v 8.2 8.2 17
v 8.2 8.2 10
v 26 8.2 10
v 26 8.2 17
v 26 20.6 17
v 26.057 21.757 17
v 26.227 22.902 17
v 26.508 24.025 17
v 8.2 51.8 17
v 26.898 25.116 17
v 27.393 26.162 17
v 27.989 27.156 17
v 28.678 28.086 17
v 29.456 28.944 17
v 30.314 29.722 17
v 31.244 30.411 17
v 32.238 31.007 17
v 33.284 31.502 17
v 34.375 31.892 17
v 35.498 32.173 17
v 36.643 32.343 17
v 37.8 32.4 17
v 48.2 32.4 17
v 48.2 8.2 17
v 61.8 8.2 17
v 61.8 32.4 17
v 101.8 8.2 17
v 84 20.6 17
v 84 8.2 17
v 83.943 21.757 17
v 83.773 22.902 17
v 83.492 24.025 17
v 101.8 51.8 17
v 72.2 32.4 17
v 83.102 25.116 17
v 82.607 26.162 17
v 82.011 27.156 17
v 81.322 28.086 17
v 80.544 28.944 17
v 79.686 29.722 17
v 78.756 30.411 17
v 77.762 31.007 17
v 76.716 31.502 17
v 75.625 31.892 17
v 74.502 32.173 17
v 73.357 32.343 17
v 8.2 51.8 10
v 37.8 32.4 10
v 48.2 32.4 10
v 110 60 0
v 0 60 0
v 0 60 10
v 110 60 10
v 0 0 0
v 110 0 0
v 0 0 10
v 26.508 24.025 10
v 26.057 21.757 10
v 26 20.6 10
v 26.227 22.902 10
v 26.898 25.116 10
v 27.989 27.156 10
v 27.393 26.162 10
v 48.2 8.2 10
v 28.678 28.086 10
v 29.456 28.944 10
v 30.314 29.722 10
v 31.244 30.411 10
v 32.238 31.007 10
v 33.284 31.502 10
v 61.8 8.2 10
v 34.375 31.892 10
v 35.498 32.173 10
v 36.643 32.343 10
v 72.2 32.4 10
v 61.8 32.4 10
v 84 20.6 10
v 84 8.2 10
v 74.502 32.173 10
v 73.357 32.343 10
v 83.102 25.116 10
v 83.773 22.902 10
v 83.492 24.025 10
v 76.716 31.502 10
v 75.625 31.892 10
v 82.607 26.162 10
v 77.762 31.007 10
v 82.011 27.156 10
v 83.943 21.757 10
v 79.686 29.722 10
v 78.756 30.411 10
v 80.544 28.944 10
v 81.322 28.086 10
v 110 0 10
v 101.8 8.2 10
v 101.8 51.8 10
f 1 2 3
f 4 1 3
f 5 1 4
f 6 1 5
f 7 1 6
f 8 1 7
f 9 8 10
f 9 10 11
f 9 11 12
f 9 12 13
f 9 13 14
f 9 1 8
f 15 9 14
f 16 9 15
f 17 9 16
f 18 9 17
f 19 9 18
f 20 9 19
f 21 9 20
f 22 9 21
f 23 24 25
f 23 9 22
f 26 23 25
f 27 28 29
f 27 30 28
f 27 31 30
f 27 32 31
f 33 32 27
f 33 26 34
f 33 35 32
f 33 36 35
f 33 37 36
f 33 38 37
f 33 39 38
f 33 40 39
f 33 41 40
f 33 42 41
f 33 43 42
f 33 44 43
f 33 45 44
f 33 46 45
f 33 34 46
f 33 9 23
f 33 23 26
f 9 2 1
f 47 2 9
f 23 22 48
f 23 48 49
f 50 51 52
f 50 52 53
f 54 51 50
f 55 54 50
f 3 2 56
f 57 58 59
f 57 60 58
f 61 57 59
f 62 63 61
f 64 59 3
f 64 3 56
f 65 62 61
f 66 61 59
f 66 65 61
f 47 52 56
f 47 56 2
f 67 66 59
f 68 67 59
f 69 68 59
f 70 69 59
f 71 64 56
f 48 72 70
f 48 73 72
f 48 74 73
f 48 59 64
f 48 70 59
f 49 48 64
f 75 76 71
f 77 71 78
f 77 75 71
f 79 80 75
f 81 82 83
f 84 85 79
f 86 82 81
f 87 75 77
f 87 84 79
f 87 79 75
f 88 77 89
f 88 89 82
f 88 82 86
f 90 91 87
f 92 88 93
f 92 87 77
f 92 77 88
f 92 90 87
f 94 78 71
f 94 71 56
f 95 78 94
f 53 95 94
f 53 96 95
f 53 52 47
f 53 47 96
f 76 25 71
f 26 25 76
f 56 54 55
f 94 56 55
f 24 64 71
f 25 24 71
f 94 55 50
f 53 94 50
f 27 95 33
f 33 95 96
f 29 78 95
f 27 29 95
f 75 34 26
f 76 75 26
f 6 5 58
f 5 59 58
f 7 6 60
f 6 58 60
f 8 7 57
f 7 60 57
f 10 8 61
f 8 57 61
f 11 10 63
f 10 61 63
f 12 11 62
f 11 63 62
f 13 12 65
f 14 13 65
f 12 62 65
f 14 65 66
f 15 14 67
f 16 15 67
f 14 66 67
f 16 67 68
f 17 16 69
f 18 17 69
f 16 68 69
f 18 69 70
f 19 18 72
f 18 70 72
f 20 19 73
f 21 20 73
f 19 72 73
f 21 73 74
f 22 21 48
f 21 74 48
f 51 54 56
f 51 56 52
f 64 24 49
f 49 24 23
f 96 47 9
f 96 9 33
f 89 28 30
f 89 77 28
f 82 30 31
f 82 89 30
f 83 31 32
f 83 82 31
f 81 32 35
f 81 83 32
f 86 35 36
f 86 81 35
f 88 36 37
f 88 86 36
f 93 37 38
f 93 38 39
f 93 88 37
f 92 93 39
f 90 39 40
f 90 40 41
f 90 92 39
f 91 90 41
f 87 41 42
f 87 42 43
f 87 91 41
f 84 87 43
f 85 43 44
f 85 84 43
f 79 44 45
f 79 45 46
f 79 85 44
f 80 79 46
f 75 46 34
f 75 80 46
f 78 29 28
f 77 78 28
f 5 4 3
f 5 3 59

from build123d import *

# Parameters (mm, degrees)
SKETCH1_W            = 110
SKETCH1_H            = 60
BOSS_EXTRUDE1_DEPTH  = 10
SKETCH3_W            = 93.6
SKETCH3_H            = 43.6
BOSS_EXTRUDE2_DEPTH  = 7
SKETCH4_W            = 22.2
SKETCH4_H            = 24.2
CUT_EXTRUDE1_DEPTH   = 7
FILLET1_R            = 11.8
FILLET1_OF_MIRROR1_R = 11.8


with BuildPart() as part:
    # Sketch1 → Boss-Extrude1 (new body)
    with BuildSketch(Plane.XY):
        with Locations((55, 30)):
            Rectangle(SKETCH1_W, SKETCH1_H)
    extrude(amount=BOSS_EXTRUDE1_DEPTH)

    # Sketch3 → Boss-Extrude2 (add)
    with BuildSketch(Plane.XY.offset(10)):
        with Locations((55, 30)):
            Rectangle(SKETCH3_W, SKETCH3_H)
    extrude(amount=BOSS_EXTRUDE2_DEPTH)

    # Sketch4 → Cut-Extrude1 (cut)
    with BuildSketch(Plane.XY.offset(17)):
        with Locations((37.1, 20.3)):
            Rectangle(SKETCH4_W, SKETCH4_H)
    cut_extrude1 = extrude(amount=-CUT_EXTRUDE1_DEPTH, mode=Mode.SUBTRACT)

    # Fillet1
    fillet1_edges = [part.edges().sort_by_distance(p)[0] for p in [
        (26, 32.4, 13.5),
    ]]
    fillet(fillet1_edges, radius=FILLET1_R)

    # Mirror1: Cut-Extrude1 across plane
    add(cut_extrude1.mirror(Plane.ZY.offset(-55)), mode=Mode.SUBTRACT)

    # Fillet1 of Mirror1
    fillet1_of_mirror1_edges = [part.edges().sort_by_distance(p)[0] for p in [
        (84, 32.4, 13.5),
    ]]
    fillet(fillet1_of_mirror1_edges, radius=FILLET1_OF_MIRROR1_R)


solid = part.part
